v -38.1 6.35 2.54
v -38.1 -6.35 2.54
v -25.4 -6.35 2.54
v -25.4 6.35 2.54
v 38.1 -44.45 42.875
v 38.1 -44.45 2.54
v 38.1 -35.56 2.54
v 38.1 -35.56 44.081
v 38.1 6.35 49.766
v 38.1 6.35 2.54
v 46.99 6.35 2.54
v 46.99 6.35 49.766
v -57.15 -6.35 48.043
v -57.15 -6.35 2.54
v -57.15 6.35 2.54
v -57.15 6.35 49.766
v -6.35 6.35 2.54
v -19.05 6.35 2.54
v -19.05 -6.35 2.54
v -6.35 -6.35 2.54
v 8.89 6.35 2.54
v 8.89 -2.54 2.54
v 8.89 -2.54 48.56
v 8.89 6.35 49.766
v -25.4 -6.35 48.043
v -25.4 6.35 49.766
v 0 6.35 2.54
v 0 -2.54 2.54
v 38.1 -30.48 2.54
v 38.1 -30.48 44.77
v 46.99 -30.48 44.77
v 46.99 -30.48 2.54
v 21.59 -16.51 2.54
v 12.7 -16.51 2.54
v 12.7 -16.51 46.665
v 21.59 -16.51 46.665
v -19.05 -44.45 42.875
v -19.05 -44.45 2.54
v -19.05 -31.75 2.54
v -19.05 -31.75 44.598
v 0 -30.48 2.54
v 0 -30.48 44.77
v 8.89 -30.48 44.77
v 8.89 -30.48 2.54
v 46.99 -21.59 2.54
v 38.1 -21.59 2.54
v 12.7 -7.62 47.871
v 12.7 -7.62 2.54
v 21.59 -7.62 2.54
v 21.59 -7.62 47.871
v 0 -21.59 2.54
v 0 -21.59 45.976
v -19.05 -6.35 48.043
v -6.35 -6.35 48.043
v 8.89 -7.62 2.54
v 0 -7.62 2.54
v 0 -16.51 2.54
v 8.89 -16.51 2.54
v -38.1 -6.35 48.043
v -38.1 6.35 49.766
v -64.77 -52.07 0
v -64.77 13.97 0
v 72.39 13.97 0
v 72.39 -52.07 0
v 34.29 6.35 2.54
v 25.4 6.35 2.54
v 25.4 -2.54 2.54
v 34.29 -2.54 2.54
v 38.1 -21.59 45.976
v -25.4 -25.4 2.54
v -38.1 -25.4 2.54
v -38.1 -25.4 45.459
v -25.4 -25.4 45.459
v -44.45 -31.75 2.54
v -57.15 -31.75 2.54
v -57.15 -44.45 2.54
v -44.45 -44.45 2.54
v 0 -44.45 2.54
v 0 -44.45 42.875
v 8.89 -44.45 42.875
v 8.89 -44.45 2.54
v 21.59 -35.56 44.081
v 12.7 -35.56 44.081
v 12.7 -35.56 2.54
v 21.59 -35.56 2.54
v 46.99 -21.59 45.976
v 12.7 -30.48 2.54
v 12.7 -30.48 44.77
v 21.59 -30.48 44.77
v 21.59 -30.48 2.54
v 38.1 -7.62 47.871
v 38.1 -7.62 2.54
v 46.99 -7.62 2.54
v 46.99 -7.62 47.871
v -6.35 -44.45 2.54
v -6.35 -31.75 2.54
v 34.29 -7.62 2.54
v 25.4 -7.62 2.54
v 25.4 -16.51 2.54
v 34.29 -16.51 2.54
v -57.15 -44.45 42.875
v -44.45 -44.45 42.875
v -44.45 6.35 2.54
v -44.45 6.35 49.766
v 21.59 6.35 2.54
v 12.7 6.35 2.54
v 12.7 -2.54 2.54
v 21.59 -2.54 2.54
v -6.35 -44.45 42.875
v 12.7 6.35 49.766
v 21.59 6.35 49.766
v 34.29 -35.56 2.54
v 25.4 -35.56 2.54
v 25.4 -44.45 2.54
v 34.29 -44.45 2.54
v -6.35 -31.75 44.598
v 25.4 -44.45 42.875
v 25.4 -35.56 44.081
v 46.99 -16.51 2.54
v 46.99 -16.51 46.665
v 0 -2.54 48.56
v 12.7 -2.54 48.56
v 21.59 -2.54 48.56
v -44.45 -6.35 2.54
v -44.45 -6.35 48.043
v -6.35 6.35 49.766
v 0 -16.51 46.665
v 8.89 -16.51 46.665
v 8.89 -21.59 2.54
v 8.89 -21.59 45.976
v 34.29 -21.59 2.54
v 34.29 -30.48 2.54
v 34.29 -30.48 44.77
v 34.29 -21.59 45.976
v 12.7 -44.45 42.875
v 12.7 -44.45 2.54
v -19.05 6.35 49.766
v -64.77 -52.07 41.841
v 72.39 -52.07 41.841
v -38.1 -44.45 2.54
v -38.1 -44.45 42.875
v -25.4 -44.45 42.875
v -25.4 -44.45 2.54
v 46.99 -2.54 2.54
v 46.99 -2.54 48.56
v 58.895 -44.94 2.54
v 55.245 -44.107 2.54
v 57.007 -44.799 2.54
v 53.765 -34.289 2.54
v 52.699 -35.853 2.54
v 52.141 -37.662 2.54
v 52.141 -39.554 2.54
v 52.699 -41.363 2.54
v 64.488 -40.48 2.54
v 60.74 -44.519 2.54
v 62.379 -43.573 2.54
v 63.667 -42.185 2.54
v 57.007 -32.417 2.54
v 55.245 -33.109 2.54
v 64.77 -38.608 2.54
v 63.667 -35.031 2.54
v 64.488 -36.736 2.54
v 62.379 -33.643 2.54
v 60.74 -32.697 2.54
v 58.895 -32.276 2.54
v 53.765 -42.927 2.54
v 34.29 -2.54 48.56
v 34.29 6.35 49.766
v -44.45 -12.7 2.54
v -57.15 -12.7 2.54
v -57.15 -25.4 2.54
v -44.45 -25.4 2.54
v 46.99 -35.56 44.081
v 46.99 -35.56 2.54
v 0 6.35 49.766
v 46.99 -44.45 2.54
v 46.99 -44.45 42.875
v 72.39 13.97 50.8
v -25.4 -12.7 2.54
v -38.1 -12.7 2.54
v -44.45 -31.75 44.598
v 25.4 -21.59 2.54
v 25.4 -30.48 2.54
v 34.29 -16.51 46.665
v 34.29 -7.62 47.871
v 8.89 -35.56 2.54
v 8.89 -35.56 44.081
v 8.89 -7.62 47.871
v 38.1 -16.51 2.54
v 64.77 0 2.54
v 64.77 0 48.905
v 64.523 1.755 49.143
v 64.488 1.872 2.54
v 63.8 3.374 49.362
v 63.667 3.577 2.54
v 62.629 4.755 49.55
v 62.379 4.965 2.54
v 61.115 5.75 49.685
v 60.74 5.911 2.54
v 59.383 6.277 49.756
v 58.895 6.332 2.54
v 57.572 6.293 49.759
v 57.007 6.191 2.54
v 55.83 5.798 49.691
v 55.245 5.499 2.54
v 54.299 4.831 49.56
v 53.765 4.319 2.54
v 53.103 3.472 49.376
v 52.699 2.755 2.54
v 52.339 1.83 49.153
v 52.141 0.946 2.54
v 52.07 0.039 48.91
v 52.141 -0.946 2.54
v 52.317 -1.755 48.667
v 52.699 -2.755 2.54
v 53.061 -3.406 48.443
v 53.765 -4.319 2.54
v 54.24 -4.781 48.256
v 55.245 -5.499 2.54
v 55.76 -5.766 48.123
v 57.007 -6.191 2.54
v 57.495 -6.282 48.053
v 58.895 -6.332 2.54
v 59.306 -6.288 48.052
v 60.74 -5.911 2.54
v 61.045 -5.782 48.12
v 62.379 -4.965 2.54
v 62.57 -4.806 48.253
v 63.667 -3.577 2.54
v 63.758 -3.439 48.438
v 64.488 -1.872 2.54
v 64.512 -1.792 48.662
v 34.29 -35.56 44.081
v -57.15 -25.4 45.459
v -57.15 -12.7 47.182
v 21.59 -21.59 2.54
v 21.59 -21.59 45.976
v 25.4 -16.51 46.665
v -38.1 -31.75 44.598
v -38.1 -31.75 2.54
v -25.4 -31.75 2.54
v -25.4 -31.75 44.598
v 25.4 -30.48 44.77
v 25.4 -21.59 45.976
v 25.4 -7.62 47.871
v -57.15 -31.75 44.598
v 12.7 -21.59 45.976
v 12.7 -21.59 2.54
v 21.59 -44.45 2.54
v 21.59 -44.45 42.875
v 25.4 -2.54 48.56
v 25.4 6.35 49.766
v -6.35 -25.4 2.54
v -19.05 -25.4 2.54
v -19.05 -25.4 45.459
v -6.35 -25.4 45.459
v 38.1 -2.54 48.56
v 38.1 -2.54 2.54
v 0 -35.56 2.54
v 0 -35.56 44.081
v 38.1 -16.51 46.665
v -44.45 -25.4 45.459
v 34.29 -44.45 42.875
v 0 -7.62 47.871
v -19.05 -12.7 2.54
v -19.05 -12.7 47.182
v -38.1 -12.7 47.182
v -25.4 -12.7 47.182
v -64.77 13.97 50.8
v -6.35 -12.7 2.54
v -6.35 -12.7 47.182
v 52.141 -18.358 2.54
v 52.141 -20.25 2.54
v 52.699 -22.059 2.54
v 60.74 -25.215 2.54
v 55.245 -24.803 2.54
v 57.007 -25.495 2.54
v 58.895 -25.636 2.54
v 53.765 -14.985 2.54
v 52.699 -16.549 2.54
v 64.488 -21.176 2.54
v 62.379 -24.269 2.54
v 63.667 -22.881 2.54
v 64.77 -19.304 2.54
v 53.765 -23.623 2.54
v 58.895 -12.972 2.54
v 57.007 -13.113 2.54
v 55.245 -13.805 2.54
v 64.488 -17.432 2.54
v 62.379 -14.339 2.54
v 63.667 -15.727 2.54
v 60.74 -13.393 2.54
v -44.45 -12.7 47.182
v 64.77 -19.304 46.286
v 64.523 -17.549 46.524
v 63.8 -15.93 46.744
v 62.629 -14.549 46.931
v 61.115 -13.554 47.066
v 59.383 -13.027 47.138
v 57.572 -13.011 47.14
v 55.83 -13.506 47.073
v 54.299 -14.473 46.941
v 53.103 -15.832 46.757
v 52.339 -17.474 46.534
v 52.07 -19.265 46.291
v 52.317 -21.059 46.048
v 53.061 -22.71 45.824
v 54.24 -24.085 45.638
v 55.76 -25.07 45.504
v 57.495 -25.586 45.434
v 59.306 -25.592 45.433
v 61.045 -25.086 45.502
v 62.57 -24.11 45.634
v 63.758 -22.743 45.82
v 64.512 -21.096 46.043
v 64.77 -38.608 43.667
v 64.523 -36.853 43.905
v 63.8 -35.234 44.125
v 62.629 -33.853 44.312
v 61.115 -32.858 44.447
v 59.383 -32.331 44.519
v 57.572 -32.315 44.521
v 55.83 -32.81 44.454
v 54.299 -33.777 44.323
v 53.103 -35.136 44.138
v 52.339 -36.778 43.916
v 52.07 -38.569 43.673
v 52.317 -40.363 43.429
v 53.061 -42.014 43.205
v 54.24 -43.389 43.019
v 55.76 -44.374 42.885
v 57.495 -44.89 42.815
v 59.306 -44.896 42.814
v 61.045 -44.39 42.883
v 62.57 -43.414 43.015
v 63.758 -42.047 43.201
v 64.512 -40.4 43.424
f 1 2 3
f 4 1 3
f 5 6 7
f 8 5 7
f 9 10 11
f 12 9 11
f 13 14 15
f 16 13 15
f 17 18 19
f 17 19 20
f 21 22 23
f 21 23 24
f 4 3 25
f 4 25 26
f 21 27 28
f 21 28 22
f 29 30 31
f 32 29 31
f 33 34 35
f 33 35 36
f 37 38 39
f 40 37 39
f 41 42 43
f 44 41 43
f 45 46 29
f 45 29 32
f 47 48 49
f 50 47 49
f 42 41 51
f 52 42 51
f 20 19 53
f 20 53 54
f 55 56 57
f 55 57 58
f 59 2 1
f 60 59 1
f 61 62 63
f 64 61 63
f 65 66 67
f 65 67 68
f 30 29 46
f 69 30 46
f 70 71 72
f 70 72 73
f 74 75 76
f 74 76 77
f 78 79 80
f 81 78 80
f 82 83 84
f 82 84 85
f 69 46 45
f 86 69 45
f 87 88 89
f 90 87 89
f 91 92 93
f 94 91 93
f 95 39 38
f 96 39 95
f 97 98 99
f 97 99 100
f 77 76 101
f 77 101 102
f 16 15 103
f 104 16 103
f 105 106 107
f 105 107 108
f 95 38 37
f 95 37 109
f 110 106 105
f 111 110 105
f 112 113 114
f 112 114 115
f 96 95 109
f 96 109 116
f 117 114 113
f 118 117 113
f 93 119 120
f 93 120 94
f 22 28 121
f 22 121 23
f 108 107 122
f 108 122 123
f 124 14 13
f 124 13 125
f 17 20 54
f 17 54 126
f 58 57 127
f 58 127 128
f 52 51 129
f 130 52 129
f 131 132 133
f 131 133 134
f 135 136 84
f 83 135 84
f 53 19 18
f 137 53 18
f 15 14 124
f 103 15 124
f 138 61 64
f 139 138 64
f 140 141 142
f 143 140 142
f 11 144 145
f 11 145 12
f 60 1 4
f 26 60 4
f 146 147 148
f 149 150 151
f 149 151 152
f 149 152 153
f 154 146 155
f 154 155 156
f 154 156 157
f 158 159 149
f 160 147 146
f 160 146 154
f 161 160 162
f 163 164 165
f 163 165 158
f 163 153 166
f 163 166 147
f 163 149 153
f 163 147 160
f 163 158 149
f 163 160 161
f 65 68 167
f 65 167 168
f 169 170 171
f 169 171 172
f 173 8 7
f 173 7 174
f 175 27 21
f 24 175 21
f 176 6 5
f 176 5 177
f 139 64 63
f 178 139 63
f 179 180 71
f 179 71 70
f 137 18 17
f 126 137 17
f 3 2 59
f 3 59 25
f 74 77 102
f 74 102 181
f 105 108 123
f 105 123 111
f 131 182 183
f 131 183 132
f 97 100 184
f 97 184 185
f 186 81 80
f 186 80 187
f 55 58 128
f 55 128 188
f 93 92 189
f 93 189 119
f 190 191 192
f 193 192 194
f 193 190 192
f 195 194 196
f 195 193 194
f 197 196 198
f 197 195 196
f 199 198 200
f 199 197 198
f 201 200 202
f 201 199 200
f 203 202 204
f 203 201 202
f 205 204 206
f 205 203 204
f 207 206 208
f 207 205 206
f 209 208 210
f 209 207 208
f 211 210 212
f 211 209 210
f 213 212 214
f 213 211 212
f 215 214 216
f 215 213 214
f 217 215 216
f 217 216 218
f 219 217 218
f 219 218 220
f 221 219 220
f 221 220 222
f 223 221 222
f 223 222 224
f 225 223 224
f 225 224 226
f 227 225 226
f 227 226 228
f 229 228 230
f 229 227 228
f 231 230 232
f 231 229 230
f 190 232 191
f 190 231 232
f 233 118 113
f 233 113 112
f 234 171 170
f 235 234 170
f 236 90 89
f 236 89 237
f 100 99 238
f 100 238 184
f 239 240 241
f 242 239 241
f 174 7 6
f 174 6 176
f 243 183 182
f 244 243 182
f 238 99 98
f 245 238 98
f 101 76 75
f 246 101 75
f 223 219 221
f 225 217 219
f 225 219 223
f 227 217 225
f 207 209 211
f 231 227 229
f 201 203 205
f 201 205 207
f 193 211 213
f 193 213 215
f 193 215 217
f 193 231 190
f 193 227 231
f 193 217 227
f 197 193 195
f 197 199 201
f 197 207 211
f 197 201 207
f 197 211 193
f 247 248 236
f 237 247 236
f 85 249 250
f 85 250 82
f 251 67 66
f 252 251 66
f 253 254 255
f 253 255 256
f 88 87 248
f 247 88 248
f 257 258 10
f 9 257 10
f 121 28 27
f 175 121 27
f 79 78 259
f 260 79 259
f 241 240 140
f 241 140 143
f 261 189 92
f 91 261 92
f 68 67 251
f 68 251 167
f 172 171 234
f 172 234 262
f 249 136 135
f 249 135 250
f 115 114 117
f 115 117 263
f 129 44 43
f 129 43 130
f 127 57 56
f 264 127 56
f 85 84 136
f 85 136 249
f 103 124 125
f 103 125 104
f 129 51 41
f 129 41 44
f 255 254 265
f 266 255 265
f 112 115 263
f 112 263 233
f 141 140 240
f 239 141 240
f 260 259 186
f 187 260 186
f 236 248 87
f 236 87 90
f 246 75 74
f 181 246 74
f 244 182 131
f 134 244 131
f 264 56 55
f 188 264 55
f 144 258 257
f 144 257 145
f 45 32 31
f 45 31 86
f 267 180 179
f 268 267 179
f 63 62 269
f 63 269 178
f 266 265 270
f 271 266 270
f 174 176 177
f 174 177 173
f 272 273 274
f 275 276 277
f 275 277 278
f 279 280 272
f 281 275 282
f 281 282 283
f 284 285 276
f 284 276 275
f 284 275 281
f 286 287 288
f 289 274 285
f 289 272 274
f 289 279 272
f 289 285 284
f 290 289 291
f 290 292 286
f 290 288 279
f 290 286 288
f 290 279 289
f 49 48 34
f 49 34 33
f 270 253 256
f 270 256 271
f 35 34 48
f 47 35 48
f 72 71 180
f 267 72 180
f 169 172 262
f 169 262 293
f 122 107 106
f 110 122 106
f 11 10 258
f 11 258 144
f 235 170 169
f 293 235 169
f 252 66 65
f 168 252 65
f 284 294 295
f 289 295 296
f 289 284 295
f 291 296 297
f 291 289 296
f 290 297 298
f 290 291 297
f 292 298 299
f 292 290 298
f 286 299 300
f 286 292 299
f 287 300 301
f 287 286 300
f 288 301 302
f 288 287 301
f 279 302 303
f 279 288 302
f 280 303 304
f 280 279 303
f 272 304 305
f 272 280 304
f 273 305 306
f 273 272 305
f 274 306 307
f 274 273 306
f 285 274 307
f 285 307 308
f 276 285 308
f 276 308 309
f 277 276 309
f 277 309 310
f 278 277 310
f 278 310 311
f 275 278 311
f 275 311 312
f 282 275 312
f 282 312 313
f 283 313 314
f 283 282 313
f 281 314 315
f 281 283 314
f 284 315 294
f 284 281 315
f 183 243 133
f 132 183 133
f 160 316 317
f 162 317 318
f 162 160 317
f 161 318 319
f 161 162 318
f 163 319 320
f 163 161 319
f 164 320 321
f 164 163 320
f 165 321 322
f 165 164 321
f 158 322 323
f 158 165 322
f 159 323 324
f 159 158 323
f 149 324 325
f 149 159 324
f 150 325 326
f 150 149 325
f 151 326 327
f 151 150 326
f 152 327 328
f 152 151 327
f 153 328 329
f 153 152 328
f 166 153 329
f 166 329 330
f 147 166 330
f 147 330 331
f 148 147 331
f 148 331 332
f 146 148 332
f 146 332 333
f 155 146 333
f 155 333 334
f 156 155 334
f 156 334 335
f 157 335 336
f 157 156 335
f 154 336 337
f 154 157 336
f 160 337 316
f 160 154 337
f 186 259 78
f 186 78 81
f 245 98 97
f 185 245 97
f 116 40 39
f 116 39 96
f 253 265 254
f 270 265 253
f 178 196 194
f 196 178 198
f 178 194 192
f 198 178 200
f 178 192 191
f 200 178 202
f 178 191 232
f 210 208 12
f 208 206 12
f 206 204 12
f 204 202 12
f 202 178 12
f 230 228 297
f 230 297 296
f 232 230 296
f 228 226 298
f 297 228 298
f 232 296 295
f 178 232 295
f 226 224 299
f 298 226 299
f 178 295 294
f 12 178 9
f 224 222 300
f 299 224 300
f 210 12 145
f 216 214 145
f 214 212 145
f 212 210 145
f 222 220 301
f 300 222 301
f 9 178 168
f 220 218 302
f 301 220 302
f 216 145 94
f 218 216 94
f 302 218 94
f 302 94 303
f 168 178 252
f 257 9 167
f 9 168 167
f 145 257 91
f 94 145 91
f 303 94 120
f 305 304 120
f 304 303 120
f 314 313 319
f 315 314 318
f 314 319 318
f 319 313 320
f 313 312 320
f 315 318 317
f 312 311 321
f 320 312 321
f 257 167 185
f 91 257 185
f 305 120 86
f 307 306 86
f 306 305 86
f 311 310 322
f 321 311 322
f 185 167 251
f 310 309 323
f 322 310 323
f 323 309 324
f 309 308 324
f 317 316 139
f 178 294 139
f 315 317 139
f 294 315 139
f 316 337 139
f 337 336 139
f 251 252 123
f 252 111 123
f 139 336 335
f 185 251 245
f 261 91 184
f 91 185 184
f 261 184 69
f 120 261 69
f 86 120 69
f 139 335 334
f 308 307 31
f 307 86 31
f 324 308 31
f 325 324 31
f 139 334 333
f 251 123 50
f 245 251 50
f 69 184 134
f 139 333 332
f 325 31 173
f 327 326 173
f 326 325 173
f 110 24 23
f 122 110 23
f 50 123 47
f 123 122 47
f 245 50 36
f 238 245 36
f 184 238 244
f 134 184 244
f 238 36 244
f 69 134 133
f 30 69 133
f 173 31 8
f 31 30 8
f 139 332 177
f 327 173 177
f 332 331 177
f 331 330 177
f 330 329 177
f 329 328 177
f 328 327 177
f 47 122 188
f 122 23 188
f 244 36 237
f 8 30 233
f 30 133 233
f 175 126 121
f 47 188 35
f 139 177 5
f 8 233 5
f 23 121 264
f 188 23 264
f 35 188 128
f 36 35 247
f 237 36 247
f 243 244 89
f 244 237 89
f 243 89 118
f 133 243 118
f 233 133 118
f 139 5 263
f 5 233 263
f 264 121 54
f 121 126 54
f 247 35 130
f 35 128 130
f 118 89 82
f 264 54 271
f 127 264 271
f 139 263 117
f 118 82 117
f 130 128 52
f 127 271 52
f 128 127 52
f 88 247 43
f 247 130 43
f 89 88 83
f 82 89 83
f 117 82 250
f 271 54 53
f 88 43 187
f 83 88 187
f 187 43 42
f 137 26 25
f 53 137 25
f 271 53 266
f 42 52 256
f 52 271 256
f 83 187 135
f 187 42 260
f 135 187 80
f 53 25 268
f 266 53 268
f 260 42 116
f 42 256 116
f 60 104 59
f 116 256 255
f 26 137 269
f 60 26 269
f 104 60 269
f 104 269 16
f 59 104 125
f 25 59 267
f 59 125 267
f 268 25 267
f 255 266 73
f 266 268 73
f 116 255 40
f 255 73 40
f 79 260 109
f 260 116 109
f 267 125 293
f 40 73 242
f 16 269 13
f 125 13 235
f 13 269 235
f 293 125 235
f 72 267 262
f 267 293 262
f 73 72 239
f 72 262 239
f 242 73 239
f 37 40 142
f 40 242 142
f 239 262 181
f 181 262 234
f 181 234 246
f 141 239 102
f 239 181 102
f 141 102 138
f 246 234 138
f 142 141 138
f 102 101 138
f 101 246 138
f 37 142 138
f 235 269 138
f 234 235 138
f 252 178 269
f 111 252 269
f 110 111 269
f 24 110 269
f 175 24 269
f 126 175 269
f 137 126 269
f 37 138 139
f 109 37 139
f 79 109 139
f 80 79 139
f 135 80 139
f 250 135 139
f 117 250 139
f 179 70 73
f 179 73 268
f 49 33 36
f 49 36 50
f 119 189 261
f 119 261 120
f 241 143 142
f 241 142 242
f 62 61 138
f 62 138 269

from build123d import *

# Parameters (mm, degrees)
F0_W     = 137.16
F0_H     = 66.04
F0_W_2   = 12.7
F0_H_2   = 12.7
F0_W_3   = 8.89
F0_H_3   = 8.89
F0_R     = 6.35
F1_DEPTH = 50.8
F2_DEPTH = 2.54
F4_DEPTH = 149.098


with BuildPart() as f1:
    # F0 (on Top) → F1 (new body)
    with BuildSketch(Plane.XY):
        with Locations((3.81, -19.05)):
            Rectangle(F0_W, F0_H)
        with Locations((-50.8, -38.1)):
            Rectangle(F0_W_2, F0_H_2, mode=Mode.SUBTRACT)
        with Locations((-31.75, -38.1)):
            Rectangle(F0_W_2, F0_H_2, mode=Mode.SUBTRACT)
        with Locations((-12.7, -38.1)):
            Rectangle(F0_W_2, F0_H_2, mode=Mode.SUBTRACT)
        with Locations((4.445, -40.005)):
            Rectangle(F0_W_3, F0_H_3, mode=Mode.SUBTRACT)
        with Locations((17.145, -40.005)):
            Rectangle(F0_W_3, F0_H_3, mode=Mode.SUBTRACT)
        with Locations((29.845, -40.005)):
            Rectangle(F0_W_3, F0_H_3, mode=Mode.SUBTRACT)
        with Locations((42.545, -40.005)):
            Rectangle(F0_W_3, F0_H_3, mode=Mode.SUBTRACT)
        with Locations((58.42, -38.608)):
            Circle(F0_R, mode=Mode.SUBTRACT)
        with Locations((4.445, -26.035)):
            Rectangle(F0_W_3, F0_H_3, mode=Mode.SUBTRACT)
        with Locations((17.145, -26.035)):
            Rectangle(F0_W_3, F0_H_3, mode=Mode.SUBTRACT)
        with Locations((29.845, -26.035)):
            Rectangle(F0_W_3, F0_H_3, mode=Mode.SUBTRACT)
        with Locations((42.545, -26.035)):
            Rectangle(F0_W_3, F0_H_3, mode=Mode.SUBTRACT)
        with Locations((58.42, -19.304)):
            Circle(F0_R, mode=Mode.SUBTRACT)
        with Locations((-50.8, -19.05)):
            Rectangle(F0_W_2, F0_H_2, mode=Mode.SUBTRACT)
        with Locations((-31.75, -19.05)):
            Rectangle(F0_W_2, F0_H_2, mode=Mode.SUBTRACT)
        with Locations((-12.7, -19.05)):
            Rectangle(F0_W_2, F0_H_2, mode=Mode.SUBTRACT)
        with Locations((-50.8, 0)):
            Rectangle(F0_W_2, F0_H_2, mode=Mode.SUBTRACT)
        with Locations((-31.75, 0)):
            Rectangle(F0_W_2, F0_H_2, mode=Mode.SUBTRACT)
        with Locations((-12.7, 0)):
            Rectangle(F0_W_2, F0_H_2, mode=Mode.SUBTRACT)
        with Locations((4.445, -12.065)):
            Rectangle(F0_W_3, F0_H_3, mode=Mode.SUBTRACT)
        with Locations((17.145, -12.065)):
            Rectangle(F0_W_3, F0_H_3, mode=Mode.SUBTRACT)
        with Locations((29.845, -12.065)):
            Rectangle(F0_W_3, F0_H_3, mode=Mode.SUBTRACT)
        with Locations((42.545, -12.065)):
            Rectangle(F0_W_3, F0_H_3, mode=Mode.SUBTRACT)
        with Locations((4.445, 1.905)):
            Rectangle(F0_W_3, F0_H_3, mode=Mode.SUBTRACT)
        with Locations((17.145, 1.905)):
            Rectangle(F0_W_3, F0_H_3, mode=Mode.SUBTRACT)
        with Locations((29.845, 1.905)):
            Rectangle(F0_W_3, F0_H_3, mode=Mode.SUBTRACT)
        with Locations((42.545, 1.905)):
            Rectangle(F0_W_3, F0_H_3, mode=Mode.SUBTRACT)
        with Locations((58.42, 0)):
            Circle(F0_R, mode=Mode.SUBTRACT)
    extrude(amount=F1_DEPTH)

    # F0 (on Top) → F2 (join)
    with BuildSketch(Plane.XY):
        with Locations((-50.8, 0)):
            Rectangle(F0_W_2, F0_H_2)
        with Locations((-31.75, 0)):
            Rectangle(F0_W_2, F0_H_2)
        with Locations((-50.8, -19.05)):
            Rectangle(F0_W_2, F0_H_2)
        with Locations((-31.75, -19.05)):
            Rectangle(F0_W_2, F0_H_2)
        with Locations((-50.8, -38.1)):
            Rectangle(F0_W_2, F0_H_2)
        with Locations((-31.75, -38.1)):
            Rectangle(F0_W_2, F0_H_2)
        with Locations((-12.7, -38.1)):
            Rectangle(F0_W_2, F0_H_2)
        with Locations((-12.7, -19.05)):
            Rectangle(F0_W_2, F0_H_2)
        with Locations((-12.7, 0)):
            Rectangle(F0_W_2, F0_H_2)
        with Locations((4.445, 1.905)):
            Rectangle(F0_W_3, F0_H_3)
        with Locations((4.445, -12.065)):
            Rectangle(F0_W_3, F0_H_3)
        with Locations((4.445, -26.035)):
            Rectangle(F0_W_3, F0_H_3)
        with Locations((4.445, -40.005)):
            Rectangle(F0_W_3, F0_H_3)
        with Locations((17.145, -40.005)):
            Rectangle(F0_W_3, F0_H_3)
        with Locations((17.145, -26.035)):
            Rectangle(F0_W_3, F0_H_3)
        with Locations((17.145, -12.065)):
            Rectangle(F0_W_3, F0_H_3)
        with Locations((17.145, 1.905)):
            Rectangle(F0_W_3, F0_H_3)
        with Locations((29.845, 1.905)):
            Rectangle(F0_W_3, F0_H_3)
        with Locations((42.545, 1.905)):
            Rectangle(F0_W_3, F0_H_3)
        with Locations((42.545, -12.065)):
            Rectangle(F0_W_3, F0_H_3)
        with Locations((29.845, -12.065)):
            Rectangle(F0_W_3, F0_H_3)
        with Locations((29.845, -26.035)):
            Rectangle(F0_W_3, F0_H_3)
        with Locations((42.545, -26.035)):
            Rectangle(F0_W_3, F0_H_3)
        with Locations((29.845, -40.005)):
            Rectangle(F0_W_3, F0_H_3)
        with Locations((42.545, -40.005)):
            Rectangle(F0_W_3, F0_H_3)
        with Locations((58.42, -38.608)):
            Circle(F0_R)
        with Locations((58.42, -19.304)):
            Circle(F0_R)
        with Locations((58.42, 0)):
            Circle(F0_R)
    extrude(amount=F2_DEPTH)

    # F3 (on face) → F4 (cut)
    with BuildSketch(Plane(origin=(-64.77, 0, 0), x_dir=(0, -1, 0), z_dir=(-1, 0, 0))):
        Polygon((52.07, 50.8), (-13.97, 50.8), (52.07, 41.841079), align=None)
    extrude(amount=-F4_DEPTH, mode=Mode.SUBTRACT)


solid = f1.part
